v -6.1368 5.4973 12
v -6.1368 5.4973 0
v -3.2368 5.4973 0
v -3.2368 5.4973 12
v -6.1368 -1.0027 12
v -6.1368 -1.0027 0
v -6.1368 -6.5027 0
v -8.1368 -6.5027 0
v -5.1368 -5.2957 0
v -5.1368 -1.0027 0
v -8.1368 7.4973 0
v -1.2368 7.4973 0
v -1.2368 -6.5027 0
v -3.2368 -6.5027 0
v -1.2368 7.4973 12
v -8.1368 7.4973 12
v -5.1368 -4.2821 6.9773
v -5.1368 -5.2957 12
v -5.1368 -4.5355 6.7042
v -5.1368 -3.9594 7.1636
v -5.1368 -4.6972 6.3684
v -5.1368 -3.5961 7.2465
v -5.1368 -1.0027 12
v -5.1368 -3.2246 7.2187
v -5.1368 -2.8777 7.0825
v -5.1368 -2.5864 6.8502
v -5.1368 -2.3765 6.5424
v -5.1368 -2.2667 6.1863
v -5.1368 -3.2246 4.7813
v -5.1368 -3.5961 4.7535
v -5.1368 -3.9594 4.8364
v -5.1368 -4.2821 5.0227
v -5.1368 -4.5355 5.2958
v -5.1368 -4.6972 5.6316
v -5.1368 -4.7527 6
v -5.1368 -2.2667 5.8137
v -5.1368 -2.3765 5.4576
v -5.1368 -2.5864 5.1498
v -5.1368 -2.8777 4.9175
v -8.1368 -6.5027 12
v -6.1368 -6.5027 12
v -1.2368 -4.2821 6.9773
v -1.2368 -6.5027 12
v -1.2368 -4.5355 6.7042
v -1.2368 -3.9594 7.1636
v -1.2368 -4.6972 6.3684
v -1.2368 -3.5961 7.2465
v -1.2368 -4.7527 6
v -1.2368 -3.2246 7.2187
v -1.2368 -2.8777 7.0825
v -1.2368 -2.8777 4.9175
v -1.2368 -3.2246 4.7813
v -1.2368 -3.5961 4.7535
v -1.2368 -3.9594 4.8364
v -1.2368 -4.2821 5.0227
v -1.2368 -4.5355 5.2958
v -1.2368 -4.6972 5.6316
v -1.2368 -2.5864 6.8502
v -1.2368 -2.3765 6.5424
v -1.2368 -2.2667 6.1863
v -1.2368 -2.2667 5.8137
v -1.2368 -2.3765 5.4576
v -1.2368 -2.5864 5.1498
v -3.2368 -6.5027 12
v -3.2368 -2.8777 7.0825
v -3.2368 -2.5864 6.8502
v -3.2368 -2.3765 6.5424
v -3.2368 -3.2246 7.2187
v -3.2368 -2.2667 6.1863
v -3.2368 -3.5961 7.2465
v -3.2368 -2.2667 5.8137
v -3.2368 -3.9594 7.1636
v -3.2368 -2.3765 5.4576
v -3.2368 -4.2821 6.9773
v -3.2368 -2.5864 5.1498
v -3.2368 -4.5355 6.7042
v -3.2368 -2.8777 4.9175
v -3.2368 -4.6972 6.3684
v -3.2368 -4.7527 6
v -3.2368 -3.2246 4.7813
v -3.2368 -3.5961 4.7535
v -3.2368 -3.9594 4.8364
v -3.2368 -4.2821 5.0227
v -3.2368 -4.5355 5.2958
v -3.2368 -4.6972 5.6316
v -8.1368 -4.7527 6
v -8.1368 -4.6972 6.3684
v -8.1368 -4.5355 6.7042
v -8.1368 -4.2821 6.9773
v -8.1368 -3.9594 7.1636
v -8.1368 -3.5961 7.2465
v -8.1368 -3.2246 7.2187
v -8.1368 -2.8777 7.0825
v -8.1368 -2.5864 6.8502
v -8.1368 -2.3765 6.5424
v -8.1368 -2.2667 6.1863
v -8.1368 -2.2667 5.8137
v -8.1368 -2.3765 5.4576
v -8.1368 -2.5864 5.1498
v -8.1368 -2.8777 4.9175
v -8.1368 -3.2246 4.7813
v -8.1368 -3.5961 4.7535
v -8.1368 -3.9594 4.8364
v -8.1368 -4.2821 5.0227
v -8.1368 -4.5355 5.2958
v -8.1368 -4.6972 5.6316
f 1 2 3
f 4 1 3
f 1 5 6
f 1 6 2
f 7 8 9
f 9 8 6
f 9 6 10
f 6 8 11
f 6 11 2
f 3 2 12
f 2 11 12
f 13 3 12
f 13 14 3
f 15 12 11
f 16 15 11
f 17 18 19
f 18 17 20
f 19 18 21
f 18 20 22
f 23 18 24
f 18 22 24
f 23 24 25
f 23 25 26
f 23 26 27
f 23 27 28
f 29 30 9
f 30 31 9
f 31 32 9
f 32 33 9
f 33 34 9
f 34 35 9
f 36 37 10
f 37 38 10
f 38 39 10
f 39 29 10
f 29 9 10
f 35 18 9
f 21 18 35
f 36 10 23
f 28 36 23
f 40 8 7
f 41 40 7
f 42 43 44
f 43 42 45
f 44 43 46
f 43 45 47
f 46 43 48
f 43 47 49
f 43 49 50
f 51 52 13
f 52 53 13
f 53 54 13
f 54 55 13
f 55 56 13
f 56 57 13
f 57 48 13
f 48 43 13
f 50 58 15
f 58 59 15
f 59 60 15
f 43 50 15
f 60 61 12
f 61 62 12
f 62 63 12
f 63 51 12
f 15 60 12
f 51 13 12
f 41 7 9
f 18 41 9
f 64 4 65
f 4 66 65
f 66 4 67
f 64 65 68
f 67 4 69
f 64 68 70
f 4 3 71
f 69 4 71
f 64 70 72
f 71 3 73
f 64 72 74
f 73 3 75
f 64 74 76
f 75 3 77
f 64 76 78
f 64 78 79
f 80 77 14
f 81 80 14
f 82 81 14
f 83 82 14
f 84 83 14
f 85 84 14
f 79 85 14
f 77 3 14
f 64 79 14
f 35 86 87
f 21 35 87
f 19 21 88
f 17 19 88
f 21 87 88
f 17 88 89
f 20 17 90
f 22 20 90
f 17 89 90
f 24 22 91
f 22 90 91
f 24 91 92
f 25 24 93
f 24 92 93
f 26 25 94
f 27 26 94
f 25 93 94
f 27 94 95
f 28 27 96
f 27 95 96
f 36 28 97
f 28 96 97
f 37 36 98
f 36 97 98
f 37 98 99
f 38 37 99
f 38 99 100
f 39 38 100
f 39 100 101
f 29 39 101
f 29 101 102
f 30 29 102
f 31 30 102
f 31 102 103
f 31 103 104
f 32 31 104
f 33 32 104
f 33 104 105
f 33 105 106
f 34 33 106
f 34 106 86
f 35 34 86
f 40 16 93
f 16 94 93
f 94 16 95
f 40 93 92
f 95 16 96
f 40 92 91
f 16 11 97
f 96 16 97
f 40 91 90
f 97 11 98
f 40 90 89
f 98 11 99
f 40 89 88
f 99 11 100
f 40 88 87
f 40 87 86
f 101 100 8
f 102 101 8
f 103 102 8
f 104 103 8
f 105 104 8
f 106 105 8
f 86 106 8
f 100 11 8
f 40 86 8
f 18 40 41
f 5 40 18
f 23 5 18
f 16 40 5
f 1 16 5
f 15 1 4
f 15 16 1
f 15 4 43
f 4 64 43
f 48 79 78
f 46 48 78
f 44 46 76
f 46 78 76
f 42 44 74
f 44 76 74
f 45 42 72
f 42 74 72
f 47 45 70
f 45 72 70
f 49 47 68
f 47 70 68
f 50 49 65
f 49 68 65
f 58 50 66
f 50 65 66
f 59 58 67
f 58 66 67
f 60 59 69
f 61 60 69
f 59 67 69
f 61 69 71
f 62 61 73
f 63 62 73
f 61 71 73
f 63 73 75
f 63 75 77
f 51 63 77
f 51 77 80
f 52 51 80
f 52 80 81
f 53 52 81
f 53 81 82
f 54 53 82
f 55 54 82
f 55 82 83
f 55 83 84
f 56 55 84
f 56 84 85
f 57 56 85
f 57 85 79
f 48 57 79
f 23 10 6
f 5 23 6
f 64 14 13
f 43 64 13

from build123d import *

# Parameters (mm, degrees)
F1_DEPTH = 12
F2_R     = 1.25
F3_DEPTH = 25


with BuildPart() as f1:
    # F0 (on Top) → F1 (new body)
    with BuildSketch(Plane.XY):
        Polygon((-8.13678, -6.502725), (-6.13678, -6.502725), (-6.13678, -1.002725), (-6.13678, 5.497275), (-3.23678, 5.497275), (-3.23678, -6.502725), (-1.23678, -6.502725), (-1.23678, 7.497275), (-8.13678, 7.497275), align=None)
        Polygon((-6.13678, -1.002725), (-6.13678, -6.502725), (-5.13678, -5.295739), (-5.13678, -1.002725), align=None)
    extrude(amount=F1_DEPTH)

    # F2 (on face) → F3 (cut)
    with BuildSketch(Plane(origin=(-8.13678, 0, 0), x_dir=(0, -1, 0), z_dir=(-1, 0, 0))):
        with Locations((3.502725, 6)):
            Circle(F2_R)
    extrude(amount=-F3_DEPTH, mode=Mode.SUBTRACT)


solid = f1.part
